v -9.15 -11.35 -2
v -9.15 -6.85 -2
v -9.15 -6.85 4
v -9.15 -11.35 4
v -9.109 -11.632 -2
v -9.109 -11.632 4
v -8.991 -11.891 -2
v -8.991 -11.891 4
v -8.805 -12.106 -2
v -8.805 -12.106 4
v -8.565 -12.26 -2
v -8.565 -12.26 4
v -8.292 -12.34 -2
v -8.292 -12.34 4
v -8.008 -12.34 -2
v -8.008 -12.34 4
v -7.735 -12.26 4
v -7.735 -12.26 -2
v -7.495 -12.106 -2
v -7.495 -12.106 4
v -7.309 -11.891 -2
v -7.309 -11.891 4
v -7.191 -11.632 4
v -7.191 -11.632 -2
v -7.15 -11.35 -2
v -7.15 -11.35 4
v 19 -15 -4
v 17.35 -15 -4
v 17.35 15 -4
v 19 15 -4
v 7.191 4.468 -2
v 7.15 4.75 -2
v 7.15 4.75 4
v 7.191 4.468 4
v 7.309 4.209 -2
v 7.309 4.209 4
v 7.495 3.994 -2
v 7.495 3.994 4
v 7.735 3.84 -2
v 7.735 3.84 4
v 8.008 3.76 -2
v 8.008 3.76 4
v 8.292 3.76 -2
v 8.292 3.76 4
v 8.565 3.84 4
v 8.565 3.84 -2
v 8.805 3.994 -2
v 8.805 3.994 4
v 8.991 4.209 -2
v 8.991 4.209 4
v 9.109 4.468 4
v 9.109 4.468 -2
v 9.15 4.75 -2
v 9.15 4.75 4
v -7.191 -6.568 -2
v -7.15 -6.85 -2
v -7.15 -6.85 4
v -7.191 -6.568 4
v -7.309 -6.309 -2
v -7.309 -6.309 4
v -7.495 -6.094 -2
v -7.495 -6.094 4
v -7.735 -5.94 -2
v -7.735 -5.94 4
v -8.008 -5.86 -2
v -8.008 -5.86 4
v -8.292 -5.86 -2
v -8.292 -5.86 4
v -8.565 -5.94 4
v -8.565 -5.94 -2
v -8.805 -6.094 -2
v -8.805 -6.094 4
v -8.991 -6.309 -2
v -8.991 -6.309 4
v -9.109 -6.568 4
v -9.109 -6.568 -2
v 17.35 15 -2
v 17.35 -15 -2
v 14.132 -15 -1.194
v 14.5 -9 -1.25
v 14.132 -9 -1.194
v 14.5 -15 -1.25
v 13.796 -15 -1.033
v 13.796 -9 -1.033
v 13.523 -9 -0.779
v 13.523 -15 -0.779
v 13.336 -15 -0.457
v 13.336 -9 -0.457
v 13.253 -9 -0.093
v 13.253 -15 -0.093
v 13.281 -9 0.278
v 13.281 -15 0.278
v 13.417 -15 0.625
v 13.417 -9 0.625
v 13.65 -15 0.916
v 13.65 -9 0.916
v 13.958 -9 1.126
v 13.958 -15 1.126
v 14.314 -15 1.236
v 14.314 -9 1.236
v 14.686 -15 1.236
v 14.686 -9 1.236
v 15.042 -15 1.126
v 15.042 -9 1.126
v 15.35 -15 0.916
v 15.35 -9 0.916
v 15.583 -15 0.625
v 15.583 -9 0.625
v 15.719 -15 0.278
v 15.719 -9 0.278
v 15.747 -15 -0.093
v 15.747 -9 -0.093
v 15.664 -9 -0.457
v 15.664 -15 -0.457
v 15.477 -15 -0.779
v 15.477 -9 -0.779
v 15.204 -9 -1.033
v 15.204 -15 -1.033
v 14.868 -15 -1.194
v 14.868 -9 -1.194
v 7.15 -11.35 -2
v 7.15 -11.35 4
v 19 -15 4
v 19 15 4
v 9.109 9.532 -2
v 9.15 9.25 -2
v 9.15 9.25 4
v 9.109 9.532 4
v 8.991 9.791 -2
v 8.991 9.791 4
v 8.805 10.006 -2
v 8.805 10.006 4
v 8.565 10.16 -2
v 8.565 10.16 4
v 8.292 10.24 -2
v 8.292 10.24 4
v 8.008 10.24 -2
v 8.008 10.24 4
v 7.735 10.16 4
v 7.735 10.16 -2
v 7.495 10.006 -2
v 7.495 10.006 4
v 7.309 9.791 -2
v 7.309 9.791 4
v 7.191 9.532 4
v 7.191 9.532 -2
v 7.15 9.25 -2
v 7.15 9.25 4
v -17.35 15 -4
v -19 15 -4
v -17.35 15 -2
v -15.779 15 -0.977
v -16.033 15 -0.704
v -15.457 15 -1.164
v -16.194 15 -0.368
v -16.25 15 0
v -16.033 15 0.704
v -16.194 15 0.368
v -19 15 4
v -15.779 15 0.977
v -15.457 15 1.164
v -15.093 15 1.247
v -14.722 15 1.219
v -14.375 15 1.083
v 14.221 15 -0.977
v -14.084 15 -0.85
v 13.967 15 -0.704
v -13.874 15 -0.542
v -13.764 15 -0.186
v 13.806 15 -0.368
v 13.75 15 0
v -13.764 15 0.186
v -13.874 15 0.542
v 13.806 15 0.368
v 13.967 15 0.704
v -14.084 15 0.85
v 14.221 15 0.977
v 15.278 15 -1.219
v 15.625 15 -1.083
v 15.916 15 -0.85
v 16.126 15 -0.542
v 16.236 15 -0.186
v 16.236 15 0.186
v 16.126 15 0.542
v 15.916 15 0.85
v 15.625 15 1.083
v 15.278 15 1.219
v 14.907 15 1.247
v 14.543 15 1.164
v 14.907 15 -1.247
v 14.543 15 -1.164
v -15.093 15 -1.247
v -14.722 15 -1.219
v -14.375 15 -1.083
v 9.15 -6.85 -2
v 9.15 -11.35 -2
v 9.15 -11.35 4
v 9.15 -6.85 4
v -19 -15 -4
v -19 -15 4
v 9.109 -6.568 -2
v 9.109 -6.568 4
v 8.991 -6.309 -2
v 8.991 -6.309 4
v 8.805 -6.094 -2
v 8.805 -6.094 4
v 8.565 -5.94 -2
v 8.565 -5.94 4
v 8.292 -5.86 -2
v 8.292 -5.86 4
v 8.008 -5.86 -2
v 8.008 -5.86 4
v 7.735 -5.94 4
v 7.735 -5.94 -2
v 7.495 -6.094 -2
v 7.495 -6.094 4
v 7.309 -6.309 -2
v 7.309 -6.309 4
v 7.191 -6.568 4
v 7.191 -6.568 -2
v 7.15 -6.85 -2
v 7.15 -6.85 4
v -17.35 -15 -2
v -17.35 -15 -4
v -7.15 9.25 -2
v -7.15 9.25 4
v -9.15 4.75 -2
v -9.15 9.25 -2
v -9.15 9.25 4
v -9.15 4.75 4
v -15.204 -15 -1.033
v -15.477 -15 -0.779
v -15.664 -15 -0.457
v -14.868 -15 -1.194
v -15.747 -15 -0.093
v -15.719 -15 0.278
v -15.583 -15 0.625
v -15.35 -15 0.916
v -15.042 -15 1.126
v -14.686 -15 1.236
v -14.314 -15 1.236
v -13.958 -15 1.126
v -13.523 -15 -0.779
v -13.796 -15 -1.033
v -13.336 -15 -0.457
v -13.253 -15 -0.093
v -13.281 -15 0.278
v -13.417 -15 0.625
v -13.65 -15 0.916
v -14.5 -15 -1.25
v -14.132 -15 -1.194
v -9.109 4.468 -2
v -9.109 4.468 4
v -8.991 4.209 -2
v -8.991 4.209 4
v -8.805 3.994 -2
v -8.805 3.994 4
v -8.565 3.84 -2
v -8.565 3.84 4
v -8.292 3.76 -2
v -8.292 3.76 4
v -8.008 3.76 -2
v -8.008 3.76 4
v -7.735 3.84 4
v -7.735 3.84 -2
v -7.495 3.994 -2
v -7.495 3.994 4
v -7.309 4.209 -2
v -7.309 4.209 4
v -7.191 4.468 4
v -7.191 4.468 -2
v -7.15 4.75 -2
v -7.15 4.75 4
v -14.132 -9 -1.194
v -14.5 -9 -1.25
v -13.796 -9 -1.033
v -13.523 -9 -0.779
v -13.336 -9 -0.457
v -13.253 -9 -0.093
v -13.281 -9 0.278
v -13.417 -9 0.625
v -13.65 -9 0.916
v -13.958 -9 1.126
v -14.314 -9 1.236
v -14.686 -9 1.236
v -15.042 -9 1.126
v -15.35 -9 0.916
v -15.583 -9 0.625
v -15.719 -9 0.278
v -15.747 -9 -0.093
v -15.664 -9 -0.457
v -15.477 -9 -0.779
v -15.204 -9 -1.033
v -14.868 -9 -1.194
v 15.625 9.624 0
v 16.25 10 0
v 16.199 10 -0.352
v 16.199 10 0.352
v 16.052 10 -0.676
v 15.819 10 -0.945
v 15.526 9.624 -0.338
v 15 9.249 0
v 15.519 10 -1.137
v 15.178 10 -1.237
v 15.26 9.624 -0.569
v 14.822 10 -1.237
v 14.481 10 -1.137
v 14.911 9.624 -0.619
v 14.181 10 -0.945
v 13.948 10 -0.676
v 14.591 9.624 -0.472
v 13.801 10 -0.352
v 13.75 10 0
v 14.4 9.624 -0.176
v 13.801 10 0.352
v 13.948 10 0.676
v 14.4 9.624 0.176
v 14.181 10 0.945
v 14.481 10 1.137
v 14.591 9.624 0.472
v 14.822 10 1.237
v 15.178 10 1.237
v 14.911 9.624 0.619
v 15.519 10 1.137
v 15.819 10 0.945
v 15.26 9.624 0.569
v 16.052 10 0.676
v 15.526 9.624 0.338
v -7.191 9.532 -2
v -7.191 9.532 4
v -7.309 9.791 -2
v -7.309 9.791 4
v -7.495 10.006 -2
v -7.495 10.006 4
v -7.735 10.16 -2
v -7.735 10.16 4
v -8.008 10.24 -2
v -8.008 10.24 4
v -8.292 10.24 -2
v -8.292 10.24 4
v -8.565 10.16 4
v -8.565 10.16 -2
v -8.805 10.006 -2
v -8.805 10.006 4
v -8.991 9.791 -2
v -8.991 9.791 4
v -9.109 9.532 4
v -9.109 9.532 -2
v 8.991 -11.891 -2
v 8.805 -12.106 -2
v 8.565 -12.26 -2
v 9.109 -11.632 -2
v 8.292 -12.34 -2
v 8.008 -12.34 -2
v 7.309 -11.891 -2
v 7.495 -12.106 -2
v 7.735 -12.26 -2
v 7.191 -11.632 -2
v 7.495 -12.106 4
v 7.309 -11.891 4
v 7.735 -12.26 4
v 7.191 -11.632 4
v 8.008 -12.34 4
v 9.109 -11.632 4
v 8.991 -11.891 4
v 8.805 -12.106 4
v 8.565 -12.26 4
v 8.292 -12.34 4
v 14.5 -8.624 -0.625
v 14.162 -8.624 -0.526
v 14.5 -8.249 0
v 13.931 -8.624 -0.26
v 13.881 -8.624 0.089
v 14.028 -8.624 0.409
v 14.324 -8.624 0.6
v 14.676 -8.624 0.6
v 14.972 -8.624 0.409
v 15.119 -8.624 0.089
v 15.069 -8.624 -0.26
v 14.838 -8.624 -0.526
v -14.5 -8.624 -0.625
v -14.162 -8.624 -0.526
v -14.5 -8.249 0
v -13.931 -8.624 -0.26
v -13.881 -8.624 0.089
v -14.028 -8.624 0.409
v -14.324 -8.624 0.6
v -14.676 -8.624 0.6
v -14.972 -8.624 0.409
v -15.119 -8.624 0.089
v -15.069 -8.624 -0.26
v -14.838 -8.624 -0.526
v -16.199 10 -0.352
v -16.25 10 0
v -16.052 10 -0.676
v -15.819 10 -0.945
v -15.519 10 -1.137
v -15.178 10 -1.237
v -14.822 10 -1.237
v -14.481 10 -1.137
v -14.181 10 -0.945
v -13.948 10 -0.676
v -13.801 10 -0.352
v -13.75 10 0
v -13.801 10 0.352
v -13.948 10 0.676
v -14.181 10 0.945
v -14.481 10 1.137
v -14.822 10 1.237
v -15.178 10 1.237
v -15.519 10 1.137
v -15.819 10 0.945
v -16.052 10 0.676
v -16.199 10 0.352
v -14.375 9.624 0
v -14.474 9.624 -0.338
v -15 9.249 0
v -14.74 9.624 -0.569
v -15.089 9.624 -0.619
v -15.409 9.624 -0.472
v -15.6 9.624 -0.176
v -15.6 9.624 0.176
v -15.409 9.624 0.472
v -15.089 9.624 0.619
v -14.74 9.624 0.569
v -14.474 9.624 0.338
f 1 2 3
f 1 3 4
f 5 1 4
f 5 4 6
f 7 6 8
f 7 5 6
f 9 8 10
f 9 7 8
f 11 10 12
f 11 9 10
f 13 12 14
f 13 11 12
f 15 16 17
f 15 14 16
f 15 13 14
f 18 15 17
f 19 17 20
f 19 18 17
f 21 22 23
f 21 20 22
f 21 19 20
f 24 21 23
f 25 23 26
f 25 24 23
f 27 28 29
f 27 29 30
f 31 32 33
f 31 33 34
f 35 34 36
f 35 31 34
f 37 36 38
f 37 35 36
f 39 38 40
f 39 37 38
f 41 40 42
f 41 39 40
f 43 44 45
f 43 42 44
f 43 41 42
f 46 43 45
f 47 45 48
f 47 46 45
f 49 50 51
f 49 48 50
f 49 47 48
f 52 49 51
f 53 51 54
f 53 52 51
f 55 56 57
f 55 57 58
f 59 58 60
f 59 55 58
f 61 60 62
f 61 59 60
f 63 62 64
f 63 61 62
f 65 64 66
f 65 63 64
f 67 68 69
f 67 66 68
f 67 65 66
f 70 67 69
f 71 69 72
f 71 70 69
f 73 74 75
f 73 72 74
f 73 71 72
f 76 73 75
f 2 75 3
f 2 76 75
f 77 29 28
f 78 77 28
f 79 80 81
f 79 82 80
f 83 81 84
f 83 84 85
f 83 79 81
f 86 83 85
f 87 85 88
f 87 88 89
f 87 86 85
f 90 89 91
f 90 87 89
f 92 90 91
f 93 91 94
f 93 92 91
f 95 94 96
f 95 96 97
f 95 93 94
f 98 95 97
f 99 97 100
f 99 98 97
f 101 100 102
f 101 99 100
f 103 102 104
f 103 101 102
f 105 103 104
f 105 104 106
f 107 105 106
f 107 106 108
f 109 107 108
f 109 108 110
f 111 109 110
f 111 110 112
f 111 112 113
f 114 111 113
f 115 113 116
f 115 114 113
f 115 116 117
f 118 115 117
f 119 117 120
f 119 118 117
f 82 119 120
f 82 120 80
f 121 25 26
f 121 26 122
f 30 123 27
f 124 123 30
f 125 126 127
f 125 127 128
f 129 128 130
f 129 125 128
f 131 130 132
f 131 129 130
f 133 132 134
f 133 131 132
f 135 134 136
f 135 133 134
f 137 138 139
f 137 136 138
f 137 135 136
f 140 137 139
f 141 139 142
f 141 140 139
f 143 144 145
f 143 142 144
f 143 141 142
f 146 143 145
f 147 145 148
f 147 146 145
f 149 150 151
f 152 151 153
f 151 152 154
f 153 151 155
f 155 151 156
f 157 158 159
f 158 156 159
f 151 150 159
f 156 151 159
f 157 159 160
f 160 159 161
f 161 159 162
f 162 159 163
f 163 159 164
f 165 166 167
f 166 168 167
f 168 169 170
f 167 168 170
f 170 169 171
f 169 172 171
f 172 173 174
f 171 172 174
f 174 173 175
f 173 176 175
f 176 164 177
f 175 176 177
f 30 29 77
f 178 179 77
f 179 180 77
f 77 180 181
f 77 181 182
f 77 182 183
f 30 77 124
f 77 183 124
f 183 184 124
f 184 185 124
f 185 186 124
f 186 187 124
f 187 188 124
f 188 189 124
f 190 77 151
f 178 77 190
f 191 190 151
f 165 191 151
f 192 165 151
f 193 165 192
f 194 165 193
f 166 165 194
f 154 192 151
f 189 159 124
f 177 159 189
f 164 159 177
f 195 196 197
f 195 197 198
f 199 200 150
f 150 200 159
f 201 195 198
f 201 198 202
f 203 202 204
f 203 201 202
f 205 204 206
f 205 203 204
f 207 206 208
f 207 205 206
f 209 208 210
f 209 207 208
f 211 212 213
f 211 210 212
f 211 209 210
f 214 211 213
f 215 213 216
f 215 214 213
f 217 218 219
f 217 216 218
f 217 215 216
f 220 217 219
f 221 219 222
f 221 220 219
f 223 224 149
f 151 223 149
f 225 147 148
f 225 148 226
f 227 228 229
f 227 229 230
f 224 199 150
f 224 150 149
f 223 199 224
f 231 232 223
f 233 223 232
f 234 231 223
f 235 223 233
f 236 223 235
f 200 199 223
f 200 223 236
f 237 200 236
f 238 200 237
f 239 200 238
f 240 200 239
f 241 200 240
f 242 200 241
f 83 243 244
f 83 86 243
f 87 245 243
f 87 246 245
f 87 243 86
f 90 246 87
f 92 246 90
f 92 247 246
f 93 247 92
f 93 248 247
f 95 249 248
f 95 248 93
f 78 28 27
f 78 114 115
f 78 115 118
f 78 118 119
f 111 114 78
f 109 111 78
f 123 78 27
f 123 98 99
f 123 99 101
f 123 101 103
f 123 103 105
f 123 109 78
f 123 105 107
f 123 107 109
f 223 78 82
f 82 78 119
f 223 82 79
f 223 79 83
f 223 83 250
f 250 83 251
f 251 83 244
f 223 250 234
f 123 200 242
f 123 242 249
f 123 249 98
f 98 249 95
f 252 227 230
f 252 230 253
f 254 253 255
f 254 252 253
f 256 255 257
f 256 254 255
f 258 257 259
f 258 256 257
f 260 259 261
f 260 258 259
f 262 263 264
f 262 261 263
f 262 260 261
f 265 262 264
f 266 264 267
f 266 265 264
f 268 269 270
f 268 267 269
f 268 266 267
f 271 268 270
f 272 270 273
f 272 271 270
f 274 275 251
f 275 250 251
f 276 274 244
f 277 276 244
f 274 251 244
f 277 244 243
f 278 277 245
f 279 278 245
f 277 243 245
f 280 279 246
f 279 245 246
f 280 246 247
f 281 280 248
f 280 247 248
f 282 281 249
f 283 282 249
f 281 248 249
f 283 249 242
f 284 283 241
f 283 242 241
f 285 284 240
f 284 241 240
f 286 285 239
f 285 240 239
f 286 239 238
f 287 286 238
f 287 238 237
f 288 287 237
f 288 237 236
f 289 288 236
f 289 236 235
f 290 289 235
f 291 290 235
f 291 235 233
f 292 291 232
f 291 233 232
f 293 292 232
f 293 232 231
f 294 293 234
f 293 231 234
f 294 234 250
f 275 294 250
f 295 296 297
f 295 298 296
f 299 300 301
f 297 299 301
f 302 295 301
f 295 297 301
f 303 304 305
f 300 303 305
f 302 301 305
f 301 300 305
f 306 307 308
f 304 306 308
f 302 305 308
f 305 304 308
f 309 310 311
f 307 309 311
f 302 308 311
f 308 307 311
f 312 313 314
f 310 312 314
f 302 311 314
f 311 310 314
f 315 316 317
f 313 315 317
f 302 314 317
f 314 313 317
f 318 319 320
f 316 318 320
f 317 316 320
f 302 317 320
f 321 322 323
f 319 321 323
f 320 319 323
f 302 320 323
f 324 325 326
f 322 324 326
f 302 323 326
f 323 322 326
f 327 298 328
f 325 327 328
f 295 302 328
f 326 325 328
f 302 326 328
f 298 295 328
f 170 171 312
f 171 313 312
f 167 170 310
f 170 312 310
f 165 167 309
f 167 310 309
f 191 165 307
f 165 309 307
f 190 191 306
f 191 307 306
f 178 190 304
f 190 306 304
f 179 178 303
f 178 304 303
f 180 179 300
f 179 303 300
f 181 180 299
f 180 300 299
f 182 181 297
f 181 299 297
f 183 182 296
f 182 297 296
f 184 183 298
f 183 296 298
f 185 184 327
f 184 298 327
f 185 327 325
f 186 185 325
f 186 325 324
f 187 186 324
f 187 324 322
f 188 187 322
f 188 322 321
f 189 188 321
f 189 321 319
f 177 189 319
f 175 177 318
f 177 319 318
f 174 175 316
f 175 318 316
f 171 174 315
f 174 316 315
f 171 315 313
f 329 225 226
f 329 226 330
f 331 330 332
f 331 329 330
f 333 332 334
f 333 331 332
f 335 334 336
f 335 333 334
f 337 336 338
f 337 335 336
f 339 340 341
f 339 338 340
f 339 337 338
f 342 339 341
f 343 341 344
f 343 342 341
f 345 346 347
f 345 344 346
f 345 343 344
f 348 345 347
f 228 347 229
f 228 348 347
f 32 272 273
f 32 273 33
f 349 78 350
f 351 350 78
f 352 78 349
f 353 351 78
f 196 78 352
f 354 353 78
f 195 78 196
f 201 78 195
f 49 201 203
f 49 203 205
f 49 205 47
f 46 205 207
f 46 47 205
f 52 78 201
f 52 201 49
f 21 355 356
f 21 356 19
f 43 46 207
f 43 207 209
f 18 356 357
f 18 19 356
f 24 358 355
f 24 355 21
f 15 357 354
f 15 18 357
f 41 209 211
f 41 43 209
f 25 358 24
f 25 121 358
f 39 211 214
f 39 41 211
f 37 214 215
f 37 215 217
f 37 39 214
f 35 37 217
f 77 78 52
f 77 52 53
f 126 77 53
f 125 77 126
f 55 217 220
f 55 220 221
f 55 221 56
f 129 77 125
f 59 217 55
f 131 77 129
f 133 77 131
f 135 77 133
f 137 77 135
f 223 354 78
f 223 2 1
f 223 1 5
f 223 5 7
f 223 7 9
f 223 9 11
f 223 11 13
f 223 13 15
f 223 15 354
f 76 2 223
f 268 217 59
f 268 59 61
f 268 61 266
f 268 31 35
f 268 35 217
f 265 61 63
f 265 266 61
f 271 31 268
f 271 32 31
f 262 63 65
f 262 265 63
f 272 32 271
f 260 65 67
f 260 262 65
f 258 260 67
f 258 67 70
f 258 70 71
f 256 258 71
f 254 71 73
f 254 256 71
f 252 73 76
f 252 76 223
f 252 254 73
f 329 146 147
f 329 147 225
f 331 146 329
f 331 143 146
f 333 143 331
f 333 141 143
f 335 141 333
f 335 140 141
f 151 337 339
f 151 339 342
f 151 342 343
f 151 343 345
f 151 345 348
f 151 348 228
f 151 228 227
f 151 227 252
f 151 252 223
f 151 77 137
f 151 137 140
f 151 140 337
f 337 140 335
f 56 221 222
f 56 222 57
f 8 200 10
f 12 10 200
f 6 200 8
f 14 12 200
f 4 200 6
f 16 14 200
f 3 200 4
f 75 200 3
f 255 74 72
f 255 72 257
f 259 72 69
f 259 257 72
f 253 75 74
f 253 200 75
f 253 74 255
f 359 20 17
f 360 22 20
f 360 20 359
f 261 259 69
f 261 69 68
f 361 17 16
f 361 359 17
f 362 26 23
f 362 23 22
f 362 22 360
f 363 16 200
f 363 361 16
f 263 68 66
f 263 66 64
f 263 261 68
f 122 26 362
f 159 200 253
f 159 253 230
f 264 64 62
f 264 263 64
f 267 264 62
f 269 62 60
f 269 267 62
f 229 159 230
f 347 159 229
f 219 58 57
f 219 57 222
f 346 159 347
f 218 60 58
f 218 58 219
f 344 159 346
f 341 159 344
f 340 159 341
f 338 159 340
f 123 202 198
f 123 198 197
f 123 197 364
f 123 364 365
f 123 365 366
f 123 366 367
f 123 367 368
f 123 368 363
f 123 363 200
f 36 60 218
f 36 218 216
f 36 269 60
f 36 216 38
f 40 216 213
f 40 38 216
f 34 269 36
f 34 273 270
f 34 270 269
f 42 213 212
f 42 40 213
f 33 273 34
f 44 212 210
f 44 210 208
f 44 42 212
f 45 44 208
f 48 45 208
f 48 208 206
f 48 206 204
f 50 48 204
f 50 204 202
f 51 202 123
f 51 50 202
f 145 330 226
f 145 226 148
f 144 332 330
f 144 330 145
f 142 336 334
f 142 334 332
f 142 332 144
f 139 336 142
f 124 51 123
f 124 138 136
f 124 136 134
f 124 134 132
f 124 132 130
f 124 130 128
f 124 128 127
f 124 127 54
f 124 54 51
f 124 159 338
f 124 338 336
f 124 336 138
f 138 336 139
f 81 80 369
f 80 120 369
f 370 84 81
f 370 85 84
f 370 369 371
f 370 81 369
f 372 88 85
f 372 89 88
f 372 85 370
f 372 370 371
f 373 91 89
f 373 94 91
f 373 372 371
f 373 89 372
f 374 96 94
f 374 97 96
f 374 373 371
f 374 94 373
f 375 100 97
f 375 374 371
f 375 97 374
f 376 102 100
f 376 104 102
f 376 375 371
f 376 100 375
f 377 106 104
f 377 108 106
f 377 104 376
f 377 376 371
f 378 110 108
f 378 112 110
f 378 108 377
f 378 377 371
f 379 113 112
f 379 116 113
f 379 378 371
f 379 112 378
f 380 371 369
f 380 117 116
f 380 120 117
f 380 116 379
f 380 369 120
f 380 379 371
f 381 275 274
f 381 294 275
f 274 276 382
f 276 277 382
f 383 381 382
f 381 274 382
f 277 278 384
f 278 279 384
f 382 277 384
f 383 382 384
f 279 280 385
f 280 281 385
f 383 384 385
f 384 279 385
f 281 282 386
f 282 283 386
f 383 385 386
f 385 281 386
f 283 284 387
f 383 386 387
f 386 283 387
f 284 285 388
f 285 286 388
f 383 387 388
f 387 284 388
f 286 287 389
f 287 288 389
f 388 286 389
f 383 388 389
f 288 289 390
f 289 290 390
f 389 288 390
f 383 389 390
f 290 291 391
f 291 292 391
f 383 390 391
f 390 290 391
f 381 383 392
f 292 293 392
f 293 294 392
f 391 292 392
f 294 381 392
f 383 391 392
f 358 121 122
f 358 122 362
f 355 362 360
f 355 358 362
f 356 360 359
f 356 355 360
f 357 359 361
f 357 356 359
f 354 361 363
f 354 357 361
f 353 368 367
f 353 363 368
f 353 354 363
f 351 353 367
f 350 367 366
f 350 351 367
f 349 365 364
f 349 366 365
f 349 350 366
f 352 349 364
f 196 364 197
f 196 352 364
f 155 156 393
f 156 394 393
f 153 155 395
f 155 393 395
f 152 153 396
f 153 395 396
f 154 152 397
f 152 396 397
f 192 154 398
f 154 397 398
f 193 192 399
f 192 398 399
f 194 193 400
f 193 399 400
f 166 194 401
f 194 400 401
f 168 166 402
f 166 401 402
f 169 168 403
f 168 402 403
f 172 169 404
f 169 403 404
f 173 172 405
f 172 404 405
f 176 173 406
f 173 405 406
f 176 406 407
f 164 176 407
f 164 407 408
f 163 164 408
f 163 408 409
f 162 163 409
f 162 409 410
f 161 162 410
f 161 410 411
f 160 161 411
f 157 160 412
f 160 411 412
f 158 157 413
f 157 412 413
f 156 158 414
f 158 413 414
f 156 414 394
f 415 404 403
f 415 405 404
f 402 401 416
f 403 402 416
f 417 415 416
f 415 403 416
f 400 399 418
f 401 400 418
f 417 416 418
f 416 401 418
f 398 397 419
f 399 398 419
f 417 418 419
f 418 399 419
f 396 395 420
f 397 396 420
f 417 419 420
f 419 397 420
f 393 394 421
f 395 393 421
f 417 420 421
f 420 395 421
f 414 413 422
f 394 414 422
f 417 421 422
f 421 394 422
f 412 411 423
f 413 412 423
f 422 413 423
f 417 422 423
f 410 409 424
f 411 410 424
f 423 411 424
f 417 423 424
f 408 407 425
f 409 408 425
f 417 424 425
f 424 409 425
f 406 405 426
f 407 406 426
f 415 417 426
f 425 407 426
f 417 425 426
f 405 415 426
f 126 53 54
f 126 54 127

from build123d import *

# Parameters (mm, degrees)
SKETCH1_W                   = 38
SKETCH1_H                   = 30
BOSS_EXTRUDE1_DEPTH         = 4
CUT_EXTRUDE1_DEPTH          = 2
CUT_EXTRUDE2_DEPTH          = 25.939927827
TAP_DRILL_FOR_M3_TAP1_D     = 2.5
TAP_DRILL_FOR_M3_TAP1_DEPTH = 5
TAP_DRILL_FOR_M3_TAP1_TIP   = 0.751075774


with BuildPart() as part:
    # Sketch1 → Boss-Extrude1 (new, symmetric)
    with BuildSketch(Plane.XY):
        Rectangle(SKETCH1_W, SKETCH1_H)
    extrude(amount=BOSS_EXTRUDE1_DEPTH, both=True)

    # Sketch2 → Cut-Extrude1 (cut)
    with BuildSketch(Plane.XY.offset(-4)):
        with BuildLine():
            Line((-17.35, -13.2), (-17.35, -3.15))
            Line((-17.35, -3.15), (-17.35, -1.5))
            Line((-17.35, -1.5), (-17.35, 15.5))
            ThreePointArc((-17.35, 15.5), (-16.910660172, 16.560660172), (-15.85, 17))
            Line((-15.85, 17), (15.85, 17))
            ThreePointArc((15.85, 17), (16.910660172, 16.560660172), (17.35, 15.5))
            Line((17.35, 15.5), (17.35, -1.5))
            Line((17.35, -1.5), (17.35, -3.15))
            Line((17.35, -3.15), (17.35, -13.2))
            Line((17.35, -13.2), (17.35, -15))
            Line((17.35, -15), (-17.35, -15))
            Line((-17.35, -15), (-17.35, -13.2))
        make_face()
    extrude(amount=CUT_EXTRUDE1_DEPTH, mode=Mode.SUBTRACT)

    # Sketch3 → Cut-Extrude2 (cut, through all)
    with BuildSketch(Plane(origin=(0, 0, -2), x_dir=(-1, 0, 0), z_dir=(0, 0, -1))):
        with BuildLine():
            Line((9.15, 9.25), (9.15, 4.75))
            ThreePointArc((9.15, 4.75), (8.15, 3.75), (7.15, 4.75))
            Line((7.15, 4.75), (-7.15, 4.75))
            ThreePointArc((-7.15, 4.75), (-8.15, 3.75), (-9.15, 4.75))
            Line((-9.15, 4.75), (-9.15, 9.25))
            ThreePointArc((-9.15, 9.25), (-8.15, 10.25), (-7.15, 9.25))
            Line((-7.15, 9.25), (7.15, 9.25))
            ThreePointArc((7.15, 9.25), (8.15, 10.25), (9.15, 9.25))
        make_face()
        with BuildLine():
            Line((-7.15, -6.85), (7.15, -6.85))
            ThreePointArc((7.15, -6.85), (8.15, -5.85), (9.15, -6.85))
            Line((9.15, -6.85), (9.15, -11.35))
            ThreePointArc((9.15, -11.35), (8.15, -12.35), (7.15, -11.35))
            Line((7.15, -11.35), (-7.15, -11.35))
            ThreePointArc((-7.15, -11.35), (-8.15, -12.35), (-9.15, -11.35))
            Line((-9.15, -11.35), (-9.15, -6.85))
            ThreePointArc((-9.15, -6.85), (-8.15, -5.85), (-7.15, -6.85))
        make_face()
    extrude(amount=-CUT_EXTRUDE2_DEPTH, mode=Mode.SUBTRACT)

    # Sketch5 → M3 Tapped Hole1 (revolve, cut)
    with BuildSketch(Plane(origin=(14.5, -15, 0), x_dir=(0, 0, -1), z_dir=(1, 0, 0))):
        Polygon((0, 0), (0, 6.751075774), (1.25, 6), (1.25, 0), align=None)
    m3_tapped_hole1 = revolve(axis=Axis((14.5, -21.35, 0), (0, 1, 0)), mode=Mode.SUBTRACT)

    # Mirror1: M3 Tapped Hole1 across plane
    add(m3_tapped_hole1.mirror(Plane(origin=(0, 0, 0), x_dir=(0, 0, 1), z_dir=(1, 0, 0))), mode=Mode.SUBTRACT)

    # Tap Drill for M3 Tap1
    with Locations(Plane(origin=(0, 15, 0), x_dir=(1, 0, 0), z_dir=(0, 1, 0))):
        with Locations((15, 0), (-15, 0)):
            Hole(TAP_DRILL_FOR_M3_TAP1_D / 2, depth=TAP_DRILL_FOR_M3_TAP1_DEPTH)
            with Locations((0, 0, -(TAP_DRILL_FOR_M3_TAP1_DEPTH + TAP_DRILL_FOR_M3_TAP1_TIP / 2))):  # 118° drill point
                Cone(0, TAP_DRILL_FOR_M3_TAP1_D / 2, TAP_DRILL_FOR_M3_TAP1_TIP, mode=Mode.SUBTRACT)


solid = part.part
